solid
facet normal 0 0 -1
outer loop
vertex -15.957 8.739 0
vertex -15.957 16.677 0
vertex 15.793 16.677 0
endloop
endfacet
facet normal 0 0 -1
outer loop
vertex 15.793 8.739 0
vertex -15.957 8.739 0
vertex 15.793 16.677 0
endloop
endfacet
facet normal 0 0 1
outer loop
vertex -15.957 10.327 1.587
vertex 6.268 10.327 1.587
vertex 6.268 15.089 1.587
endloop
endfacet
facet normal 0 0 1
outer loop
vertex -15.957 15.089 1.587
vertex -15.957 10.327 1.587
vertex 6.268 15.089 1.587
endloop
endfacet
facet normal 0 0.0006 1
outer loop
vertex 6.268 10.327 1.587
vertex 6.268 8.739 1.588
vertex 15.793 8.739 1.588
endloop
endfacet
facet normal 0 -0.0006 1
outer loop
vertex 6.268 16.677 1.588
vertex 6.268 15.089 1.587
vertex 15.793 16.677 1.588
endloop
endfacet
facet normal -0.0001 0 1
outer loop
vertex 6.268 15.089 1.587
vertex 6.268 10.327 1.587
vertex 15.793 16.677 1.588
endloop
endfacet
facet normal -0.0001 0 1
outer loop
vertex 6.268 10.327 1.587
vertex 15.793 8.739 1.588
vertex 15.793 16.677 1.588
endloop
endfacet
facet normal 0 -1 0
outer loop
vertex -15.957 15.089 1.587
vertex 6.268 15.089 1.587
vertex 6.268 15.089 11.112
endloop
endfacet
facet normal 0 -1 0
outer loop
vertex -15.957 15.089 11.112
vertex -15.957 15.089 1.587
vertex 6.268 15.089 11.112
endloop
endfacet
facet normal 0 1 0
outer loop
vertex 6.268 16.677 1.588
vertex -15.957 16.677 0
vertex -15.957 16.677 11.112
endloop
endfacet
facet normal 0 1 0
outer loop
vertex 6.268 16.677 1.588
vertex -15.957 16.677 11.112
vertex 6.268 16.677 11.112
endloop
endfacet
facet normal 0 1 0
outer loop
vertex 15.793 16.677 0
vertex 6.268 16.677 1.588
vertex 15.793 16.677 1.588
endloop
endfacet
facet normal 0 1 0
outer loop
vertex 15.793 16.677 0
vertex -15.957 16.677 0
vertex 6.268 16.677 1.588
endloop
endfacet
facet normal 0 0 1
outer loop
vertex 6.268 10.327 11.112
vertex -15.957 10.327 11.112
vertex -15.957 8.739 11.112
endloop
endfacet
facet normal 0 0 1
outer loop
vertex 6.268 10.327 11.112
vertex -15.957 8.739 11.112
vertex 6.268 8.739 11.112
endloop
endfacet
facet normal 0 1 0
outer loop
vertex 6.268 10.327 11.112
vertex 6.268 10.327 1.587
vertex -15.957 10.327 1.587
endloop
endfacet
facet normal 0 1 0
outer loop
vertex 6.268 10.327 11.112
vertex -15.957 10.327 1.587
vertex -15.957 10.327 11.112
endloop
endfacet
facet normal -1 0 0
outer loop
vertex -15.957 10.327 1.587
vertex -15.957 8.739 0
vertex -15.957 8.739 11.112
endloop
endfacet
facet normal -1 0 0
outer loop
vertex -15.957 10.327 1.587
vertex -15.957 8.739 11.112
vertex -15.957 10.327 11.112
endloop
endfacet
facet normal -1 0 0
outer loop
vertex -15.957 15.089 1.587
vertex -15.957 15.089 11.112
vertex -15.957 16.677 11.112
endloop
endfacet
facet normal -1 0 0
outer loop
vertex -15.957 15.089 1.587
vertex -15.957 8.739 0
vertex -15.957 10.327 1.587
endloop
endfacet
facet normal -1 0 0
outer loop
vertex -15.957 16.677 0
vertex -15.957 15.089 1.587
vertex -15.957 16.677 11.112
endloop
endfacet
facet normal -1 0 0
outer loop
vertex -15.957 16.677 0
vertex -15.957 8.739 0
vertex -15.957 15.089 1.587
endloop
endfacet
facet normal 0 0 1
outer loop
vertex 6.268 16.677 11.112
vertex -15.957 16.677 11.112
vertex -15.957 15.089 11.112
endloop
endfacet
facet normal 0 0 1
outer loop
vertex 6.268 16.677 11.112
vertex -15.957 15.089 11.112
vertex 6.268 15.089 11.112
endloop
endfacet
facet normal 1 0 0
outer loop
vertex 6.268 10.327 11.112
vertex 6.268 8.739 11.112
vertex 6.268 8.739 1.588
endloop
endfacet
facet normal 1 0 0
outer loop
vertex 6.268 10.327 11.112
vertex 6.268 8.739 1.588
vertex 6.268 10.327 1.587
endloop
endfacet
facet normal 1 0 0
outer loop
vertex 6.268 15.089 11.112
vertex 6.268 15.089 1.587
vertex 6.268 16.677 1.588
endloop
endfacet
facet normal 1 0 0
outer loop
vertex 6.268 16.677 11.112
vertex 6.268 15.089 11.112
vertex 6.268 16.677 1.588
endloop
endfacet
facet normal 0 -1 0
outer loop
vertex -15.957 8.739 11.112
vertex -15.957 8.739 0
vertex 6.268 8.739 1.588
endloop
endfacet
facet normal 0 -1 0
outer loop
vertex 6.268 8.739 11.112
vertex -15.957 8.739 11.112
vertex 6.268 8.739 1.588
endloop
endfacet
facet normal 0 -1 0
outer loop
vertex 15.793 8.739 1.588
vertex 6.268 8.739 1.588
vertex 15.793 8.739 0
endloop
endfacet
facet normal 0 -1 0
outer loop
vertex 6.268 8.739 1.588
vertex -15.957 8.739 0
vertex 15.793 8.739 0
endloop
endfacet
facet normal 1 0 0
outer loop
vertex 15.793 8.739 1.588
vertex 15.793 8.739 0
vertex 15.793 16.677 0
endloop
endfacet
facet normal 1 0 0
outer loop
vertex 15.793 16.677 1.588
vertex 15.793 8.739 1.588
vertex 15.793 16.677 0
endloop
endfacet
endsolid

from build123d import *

# Parameters (mm, degrees)
F0_W     = 31.75
F0_H     = 7.9375
F1_DEPTH = 11.1125
F2_W     = 9.525
F2_H     = 7.9375
F3_DEPTH = 9.525
F4_W     = 4.7625
F4_H     = 9.525
F5_DEPTH = 22.226


# Not quite as in the source:
# - a length typed as a fraction of an inch, garbled in the dataset ("3 / 203.2 mm" for 3/8 in), is restored


with BuildPart() as f1:
    # F0 (on Top) → F1 (new body)
    with BuildSketch(Plane.XY):
        with Locations((-0.0819904208, 12.7078423367)):
            Rectangle(F0_W, F0_H)
    extrude(amount=F1_DEPTH)

    # F2 (on face) → F3 (cut)
    with BuildSketch(Plane.XY.offset(11.1125)):
        with Locations((11.0305095792, 12.7078423367)):
            Rectangle(F2_W, F2_H)
    extrude(amount=-F3_DEPTH, mode=Mode.SUBTRACT)

    # F4 (on face) → F5 (cut, through all)
    with BuildSketch(Plane.YZ.offset(6.2680095792)):
        with Locations((12.7078423367, 6.35)):
            Rectangle(F4_W, F4_H)
    extrude(amount=-F5_DEPTH, mode=Mode.SUBTRACT)


solid = f1.part
